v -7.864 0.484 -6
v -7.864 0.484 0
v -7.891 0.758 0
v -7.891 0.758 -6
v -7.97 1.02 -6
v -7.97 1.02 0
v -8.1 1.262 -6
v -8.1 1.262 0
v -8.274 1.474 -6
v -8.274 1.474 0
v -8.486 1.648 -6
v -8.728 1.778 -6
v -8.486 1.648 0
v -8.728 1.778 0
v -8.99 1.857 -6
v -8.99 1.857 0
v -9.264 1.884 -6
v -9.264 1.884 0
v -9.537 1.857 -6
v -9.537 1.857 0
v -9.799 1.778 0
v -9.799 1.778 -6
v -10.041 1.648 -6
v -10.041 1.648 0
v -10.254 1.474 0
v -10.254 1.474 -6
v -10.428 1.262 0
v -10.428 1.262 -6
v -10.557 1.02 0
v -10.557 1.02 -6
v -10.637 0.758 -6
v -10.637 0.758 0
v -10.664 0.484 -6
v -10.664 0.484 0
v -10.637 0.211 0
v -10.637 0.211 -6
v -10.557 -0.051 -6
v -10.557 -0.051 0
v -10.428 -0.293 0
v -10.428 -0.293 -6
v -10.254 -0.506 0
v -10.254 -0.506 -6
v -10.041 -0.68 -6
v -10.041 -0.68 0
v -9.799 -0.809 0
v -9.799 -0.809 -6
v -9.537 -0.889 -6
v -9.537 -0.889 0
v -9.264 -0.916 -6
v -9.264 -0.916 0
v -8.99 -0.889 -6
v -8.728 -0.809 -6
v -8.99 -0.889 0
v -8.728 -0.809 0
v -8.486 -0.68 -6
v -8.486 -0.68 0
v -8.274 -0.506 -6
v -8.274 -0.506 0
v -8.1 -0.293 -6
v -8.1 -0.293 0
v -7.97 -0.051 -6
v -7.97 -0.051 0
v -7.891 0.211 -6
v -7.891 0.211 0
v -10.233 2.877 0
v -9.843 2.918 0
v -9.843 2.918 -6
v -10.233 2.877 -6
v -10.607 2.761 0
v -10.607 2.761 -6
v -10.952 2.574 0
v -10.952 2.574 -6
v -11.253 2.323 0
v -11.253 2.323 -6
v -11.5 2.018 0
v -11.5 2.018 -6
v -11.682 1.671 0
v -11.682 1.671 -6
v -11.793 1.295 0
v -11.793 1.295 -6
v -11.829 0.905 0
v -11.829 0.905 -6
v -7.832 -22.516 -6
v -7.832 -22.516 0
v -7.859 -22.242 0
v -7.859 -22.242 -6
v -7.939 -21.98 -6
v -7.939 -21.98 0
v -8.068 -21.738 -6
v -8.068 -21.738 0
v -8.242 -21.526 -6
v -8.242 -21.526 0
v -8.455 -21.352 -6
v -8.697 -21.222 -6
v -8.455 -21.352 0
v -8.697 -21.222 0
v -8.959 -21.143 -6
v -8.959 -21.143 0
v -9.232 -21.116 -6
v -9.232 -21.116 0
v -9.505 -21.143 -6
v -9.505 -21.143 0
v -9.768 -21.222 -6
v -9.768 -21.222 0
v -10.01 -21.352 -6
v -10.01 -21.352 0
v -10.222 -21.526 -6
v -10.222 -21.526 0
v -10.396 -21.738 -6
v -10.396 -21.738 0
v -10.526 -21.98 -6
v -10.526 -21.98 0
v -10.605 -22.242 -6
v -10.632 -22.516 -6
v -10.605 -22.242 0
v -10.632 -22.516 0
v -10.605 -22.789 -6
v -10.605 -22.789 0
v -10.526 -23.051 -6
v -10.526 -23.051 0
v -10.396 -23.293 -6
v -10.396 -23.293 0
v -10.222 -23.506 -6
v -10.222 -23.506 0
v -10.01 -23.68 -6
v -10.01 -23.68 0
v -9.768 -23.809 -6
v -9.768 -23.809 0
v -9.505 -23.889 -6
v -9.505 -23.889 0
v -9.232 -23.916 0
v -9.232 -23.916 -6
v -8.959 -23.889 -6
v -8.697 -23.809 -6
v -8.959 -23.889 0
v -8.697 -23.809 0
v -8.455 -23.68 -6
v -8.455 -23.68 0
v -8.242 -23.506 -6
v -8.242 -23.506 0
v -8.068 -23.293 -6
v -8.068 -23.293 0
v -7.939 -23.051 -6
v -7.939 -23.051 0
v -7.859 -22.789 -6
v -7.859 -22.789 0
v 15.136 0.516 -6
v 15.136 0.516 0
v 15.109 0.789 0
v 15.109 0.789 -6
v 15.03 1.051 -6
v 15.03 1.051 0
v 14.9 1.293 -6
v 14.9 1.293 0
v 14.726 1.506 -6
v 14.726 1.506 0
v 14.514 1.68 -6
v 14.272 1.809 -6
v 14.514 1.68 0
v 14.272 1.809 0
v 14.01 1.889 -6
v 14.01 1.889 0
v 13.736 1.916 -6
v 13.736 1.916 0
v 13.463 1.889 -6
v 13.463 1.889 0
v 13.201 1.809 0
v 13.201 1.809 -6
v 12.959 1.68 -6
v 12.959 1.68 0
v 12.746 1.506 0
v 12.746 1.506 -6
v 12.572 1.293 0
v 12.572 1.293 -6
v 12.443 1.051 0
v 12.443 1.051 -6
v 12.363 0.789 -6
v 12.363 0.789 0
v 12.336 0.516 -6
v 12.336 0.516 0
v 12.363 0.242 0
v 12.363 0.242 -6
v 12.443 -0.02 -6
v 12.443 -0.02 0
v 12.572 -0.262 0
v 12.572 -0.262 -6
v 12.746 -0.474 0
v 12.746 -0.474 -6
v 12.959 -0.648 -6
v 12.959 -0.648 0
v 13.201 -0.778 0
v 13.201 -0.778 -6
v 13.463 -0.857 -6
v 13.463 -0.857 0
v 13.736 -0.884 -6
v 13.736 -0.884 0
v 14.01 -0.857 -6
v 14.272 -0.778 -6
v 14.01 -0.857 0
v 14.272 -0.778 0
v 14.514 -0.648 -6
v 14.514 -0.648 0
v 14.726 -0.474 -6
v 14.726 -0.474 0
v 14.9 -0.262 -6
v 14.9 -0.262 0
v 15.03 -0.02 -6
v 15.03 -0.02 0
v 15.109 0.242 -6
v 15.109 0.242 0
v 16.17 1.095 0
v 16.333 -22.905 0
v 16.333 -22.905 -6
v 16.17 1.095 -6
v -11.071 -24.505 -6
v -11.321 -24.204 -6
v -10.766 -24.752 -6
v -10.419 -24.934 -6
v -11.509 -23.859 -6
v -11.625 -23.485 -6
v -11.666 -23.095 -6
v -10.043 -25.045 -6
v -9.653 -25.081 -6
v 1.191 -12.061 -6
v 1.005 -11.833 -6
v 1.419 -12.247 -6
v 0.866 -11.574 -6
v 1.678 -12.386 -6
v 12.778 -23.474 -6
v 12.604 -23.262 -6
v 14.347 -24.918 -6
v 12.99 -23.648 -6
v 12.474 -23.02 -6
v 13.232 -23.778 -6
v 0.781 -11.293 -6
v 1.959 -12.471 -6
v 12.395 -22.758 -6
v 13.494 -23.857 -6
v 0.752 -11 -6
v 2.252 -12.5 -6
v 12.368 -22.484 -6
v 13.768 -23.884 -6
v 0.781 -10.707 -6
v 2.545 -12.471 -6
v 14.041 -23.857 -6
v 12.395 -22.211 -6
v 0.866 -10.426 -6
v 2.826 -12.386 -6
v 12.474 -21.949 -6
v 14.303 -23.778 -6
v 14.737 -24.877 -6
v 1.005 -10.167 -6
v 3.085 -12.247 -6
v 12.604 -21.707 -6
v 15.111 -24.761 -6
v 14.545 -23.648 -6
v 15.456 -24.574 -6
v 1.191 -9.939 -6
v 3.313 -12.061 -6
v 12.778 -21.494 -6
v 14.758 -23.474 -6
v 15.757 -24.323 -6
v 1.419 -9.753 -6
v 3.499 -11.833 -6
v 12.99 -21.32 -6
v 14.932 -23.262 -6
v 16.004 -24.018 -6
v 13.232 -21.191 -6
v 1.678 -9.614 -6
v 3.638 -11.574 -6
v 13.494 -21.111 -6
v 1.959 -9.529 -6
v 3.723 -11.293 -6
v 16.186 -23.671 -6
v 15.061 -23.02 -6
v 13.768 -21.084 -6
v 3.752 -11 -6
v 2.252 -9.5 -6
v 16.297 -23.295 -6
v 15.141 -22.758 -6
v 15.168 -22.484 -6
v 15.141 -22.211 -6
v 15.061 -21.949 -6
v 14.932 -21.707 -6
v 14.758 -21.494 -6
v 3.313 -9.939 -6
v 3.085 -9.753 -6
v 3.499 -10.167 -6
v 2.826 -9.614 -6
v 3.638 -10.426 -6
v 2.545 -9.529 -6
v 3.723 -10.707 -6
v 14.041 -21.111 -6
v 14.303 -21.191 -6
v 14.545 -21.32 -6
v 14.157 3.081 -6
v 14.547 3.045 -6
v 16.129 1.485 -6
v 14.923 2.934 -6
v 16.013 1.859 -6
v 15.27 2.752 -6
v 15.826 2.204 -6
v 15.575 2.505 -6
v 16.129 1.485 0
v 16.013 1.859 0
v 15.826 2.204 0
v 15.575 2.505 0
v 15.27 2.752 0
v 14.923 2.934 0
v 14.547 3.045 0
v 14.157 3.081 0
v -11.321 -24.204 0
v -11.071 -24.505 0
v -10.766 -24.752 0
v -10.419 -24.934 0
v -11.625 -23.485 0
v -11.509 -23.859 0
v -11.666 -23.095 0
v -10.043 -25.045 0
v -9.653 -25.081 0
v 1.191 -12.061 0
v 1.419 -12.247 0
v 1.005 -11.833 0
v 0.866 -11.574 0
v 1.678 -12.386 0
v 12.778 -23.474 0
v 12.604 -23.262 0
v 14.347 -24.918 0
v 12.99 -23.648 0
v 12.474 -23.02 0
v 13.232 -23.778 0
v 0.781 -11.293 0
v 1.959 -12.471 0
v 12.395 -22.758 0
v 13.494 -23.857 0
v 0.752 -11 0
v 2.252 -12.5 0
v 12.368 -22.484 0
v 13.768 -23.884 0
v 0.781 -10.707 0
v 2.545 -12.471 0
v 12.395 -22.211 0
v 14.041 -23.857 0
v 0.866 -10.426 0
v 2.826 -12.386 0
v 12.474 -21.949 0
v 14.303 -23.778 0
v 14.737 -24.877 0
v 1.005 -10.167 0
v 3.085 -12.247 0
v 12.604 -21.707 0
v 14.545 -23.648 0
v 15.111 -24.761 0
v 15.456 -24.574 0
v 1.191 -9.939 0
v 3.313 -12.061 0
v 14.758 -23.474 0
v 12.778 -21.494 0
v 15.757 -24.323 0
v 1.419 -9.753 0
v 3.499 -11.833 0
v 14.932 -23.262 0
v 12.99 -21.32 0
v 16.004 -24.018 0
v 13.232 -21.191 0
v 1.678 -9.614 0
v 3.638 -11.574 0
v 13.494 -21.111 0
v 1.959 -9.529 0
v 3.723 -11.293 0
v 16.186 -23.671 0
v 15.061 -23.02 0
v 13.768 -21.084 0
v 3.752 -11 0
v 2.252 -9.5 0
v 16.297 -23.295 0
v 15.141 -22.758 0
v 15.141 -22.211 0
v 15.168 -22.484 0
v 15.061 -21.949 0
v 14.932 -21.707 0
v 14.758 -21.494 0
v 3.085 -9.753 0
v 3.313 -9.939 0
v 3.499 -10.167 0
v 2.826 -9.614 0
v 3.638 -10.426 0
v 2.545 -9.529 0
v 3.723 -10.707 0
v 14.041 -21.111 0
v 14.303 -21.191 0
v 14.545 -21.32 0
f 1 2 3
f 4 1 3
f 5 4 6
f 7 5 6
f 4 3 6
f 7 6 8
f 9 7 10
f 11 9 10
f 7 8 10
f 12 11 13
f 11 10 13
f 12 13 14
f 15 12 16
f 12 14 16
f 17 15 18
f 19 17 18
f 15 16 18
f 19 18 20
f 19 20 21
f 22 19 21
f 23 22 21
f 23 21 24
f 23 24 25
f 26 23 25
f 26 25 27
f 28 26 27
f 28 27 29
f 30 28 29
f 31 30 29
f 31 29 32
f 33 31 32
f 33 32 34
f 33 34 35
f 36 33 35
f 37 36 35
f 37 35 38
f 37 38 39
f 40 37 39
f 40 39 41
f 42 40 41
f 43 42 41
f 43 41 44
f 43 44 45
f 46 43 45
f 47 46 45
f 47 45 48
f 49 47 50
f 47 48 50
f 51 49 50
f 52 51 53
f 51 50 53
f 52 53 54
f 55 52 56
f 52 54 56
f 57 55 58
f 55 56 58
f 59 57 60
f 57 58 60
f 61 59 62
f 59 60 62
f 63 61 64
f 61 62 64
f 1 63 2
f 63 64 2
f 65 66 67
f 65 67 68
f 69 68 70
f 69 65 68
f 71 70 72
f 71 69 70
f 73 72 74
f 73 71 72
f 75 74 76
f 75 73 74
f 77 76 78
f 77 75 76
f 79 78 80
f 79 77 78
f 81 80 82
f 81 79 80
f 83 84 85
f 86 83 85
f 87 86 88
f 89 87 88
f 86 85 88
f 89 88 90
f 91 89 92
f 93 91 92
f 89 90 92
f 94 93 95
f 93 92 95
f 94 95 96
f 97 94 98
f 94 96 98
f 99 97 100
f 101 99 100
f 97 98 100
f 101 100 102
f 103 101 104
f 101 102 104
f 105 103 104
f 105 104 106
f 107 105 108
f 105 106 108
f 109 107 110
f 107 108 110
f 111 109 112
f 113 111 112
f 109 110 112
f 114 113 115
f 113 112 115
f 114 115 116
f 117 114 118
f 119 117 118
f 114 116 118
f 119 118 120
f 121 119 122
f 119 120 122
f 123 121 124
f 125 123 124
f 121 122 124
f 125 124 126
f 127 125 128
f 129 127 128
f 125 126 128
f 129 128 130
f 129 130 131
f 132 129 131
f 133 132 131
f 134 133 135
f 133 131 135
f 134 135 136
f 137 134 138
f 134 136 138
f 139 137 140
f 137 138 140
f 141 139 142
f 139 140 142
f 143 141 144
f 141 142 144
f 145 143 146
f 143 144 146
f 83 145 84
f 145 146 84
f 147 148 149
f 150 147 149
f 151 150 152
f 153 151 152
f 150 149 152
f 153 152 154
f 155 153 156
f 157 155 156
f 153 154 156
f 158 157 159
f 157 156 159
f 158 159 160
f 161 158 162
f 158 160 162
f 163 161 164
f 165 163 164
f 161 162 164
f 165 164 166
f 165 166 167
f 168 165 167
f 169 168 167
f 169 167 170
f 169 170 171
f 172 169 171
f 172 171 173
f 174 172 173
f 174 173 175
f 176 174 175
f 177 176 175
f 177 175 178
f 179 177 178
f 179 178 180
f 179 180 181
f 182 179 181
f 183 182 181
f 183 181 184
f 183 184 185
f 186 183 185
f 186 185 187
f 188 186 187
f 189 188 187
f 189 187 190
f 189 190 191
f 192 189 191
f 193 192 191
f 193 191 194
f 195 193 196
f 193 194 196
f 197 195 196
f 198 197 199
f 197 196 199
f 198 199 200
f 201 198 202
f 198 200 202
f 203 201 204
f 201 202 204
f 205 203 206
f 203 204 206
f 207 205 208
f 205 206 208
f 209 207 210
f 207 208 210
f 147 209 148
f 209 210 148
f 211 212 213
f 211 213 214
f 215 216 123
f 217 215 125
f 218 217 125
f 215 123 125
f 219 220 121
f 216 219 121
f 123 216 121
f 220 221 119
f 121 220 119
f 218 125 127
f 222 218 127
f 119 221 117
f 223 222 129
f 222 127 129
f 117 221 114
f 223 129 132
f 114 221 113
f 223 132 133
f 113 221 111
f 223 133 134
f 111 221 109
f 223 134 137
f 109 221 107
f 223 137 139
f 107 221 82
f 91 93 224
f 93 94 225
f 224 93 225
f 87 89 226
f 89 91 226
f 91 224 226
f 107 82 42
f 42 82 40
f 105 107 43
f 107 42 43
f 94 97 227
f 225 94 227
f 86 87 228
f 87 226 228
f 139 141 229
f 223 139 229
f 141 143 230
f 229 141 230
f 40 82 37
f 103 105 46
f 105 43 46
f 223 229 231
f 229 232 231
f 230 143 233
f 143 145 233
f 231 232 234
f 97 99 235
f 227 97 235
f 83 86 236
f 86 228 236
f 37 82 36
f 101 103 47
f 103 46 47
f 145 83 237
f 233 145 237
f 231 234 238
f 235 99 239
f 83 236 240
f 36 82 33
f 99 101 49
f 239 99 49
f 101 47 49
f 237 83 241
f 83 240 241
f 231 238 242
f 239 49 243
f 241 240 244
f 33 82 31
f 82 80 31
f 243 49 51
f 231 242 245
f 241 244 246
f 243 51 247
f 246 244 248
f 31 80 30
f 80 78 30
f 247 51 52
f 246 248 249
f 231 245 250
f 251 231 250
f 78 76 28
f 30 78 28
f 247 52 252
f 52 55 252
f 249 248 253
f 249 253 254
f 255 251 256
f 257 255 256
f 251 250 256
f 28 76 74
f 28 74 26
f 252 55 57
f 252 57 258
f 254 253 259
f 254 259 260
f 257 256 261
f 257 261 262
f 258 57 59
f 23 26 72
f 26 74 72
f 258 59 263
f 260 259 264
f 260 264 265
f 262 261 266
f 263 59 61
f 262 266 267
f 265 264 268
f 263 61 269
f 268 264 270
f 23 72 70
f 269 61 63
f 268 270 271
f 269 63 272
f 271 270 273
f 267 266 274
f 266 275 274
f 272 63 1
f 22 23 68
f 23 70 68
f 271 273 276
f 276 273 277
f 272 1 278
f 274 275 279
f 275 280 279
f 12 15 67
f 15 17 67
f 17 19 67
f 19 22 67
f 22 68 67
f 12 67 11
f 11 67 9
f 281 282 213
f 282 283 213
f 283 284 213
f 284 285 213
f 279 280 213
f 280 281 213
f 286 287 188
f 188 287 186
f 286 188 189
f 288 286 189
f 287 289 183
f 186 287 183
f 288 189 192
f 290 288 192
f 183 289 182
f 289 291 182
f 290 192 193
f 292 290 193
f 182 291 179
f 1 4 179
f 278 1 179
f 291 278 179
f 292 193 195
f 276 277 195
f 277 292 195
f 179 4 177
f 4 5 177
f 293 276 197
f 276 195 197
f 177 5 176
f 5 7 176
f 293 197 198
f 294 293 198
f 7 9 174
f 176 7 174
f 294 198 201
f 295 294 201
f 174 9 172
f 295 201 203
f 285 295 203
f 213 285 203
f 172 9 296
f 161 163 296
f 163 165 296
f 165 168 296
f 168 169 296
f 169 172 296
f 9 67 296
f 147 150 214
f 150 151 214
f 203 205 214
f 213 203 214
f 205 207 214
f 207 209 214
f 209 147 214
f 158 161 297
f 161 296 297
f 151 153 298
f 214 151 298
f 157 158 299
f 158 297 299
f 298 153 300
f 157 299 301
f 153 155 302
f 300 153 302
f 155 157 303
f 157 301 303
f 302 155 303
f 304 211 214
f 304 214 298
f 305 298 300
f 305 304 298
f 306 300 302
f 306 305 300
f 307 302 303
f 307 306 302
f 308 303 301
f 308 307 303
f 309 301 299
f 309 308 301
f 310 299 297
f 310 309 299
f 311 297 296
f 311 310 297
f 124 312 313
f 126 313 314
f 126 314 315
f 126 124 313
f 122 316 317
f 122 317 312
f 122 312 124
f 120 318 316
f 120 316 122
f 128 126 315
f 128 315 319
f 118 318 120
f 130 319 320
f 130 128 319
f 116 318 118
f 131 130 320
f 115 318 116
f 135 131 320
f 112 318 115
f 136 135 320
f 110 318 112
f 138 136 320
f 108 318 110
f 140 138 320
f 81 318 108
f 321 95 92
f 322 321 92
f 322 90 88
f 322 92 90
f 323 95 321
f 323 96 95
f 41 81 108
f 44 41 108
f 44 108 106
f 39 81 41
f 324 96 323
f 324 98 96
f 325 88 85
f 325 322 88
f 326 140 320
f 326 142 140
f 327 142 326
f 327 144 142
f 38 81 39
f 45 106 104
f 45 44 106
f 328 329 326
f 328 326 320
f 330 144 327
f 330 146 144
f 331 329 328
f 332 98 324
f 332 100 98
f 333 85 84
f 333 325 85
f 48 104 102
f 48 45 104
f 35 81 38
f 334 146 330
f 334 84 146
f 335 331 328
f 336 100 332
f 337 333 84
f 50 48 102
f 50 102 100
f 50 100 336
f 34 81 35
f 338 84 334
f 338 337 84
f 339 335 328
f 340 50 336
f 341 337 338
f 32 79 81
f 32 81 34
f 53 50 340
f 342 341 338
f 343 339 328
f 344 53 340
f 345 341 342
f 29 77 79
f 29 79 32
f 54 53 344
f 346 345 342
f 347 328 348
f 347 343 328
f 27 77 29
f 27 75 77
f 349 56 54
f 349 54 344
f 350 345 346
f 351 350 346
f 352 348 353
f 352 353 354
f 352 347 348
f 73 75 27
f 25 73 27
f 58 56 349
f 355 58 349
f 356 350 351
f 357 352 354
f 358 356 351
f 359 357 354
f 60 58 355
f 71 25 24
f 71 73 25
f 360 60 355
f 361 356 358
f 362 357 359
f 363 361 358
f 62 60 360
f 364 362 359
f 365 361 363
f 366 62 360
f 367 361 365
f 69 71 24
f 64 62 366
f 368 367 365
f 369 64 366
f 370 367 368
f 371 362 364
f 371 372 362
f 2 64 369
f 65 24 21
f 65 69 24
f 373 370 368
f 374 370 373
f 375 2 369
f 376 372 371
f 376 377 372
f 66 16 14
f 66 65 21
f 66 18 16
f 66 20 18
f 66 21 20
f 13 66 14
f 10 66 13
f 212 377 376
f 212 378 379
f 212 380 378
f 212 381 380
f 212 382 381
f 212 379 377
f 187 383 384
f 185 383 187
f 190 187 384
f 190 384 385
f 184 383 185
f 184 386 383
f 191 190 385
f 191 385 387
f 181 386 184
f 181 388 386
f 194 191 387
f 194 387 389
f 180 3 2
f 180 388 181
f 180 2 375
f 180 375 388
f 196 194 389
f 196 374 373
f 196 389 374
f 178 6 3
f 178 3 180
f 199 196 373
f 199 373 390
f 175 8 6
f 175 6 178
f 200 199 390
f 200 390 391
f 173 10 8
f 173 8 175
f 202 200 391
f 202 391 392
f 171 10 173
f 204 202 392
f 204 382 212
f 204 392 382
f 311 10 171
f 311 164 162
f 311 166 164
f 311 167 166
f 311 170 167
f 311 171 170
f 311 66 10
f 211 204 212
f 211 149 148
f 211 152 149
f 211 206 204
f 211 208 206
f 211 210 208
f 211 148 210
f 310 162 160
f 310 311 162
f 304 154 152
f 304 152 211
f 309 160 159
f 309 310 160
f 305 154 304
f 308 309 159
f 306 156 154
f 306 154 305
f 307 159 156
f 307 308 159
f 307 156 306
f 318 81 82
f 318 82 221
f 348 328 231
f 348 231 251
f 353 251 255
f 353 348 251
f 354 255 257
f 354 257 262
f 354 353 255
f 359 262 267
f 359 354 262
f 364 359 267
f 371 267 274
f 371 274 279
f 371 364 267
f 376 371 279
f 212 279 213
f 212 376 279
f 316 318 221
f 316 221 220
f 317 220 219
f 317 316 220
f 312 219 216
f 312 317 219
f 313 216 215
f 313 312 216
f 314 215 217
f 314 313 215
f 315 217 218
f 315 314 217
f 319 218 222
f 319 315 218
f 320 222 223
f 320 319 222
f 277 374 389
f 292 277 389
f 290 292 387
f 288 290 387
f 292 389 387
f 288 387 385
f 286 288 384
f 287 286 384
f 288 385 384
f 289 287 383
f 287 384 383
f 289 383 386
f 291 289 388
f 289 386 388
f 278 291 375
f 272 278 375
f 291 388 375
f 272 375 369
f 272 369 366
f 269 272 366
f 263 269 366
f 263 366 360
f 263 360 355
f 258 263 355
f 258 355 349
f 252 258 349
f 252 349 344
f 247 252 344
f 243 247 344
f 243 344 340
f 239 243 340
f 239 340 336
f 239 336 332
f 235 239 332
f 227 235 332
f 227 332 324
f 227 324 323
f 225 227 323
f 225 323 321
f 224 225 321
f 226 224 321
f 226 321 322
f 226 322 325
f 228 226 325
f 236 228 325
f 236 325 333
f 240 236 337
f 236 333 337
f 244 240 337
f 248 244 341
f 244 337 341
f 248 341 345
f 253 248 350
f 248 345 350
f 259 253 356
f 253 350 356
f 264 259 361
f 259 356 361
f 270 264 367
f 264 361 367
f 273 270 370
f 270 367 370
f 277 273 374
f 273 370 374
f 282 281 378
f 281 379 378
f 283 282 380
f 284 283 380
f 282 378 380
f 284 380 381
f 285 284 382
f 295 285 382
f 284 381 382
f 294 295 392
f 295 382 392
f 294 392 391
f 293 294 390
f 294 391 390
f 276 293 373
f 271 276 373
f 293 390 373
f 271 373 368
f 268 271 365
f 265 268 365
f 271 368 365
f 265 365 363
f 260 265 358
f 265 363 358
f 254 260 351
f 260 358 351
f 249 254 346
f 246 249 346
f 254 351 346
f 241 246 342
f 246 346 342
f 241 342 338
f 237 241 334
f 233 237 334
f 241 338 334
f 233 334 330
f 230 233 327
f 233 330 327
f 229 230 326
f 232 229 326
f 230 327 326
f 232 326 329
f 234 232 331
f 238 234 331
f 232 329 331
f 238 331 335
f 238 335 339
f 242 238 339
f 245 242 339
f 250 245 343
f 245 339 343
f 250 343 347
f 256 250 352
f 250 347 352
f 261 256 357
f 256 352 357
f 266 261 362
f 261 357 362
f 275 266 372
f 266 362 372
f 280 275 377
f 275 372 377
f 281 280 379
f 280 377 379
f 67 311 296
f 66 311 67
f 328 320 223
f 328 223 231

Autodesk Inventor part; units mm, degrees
ref_plane "YZ Plane" through (0, 0, 0) normal (1, 0, 0) x (0, 1, 0)
ref_plane "XZ Plane" through (0, 0, 0) normal (0, 1, 0) x (-1, 0, 0)
ref_plane "XY Plane" through (0, 0, 0) normal (0, 0, 1) x (1, 0, 0)
ref_plane "Arbeitsebene1" through (0, 0, 0) normal (0, 0, 1) x (1, 0, 0)
sketch "Skizze1" plane through (0, 0, 0) normal (0, 0, 1) x (1, 0, 0)
  line L0 (11.7109, -4.9124) -> (9.211, -4.9293) projected
  line L1 (9.211, -4.9293) -> (9.1974, -2.9294) projected
  line L2 (9.1974, -2.9294) -> (-3.8023, -3.0177) projected
  line L3 (-3.8023, -3.0177) -> (-3.8306, 1.1495) projected
  line L4 (-3.8306, 1.1495) -> (-6.8306, 1.1291) projected
  line L5 (-6.8306, 1.1291) -> (-6.6653, -23.2049) projected
  line L6 (-6.6653, -23.2049) -> (-3.6653, -23.1845) projected
  line L7 (-3.6653, -23.1845) -> (-3.6937, -19.0173) projected
  line L8 (-3.6937, -19.0173) -> (9.306, -18.929) projected
  line L9 (9.306, -18.929) -> (9.2925, -16.9291) projected
  line L10 (9.2925, -16.9291) -> (11.7924, -16.9121) projected
  line L11 (11.7924, -16.9121) -> (11.7109, -4.9124) projected
  circle A0 centre (13.7364, 0.5156) radius 1.025 projected
  circle A1 centre (13.7676, -22.4844) radius 1.025 projected
  circle A2 centre (-9.2323, -22.5156) radius 1.025 projected
  circle A3 centre (-9.2636, 0.4844) radius 1.025 projected
  line L12 (-11.8291, 0.9046) -> (-11.6661, -23.0948) projected
  arc A4 (-9.8428, 2.9182) -> (-11.8291, 0.9046) centre (-9.8292, 0.9182) ccw projected
  line L13 (14.1567, 3.0812) -> (-9.8428, 2.9182) projected
  arc A5 (16.1702, 1.0948) -> (14.1567, 3.0812) centre (14.1703, 1.0812) ccw projected
  line L14 (16.3332, -22.9046) -> (16.1702, 1.0948) projected
  arc A6 (14.3468, -24.9182) -> (16.3332, -22.9046) centre (14.3333, -22.9182) ccw projected
  line L15 (-9.6526, -25.0812) -> (14.3468, -24.9182) projected
  arc A7 (-11.6661, -23.0948) -> (-9.6526, -25.0812) centre (-9.6662, -23.0812) ccw projected
  circle A8 centre (2.252, -11) radius 7.5 projected
  circle A9 centre (2.252, -11) radius 1.5
  circle A10 centre (-9.2323, -22.5156) radius 1.4
  circle A11 centre (13.7676, -22.4844) radius 1.4
  circle A12 centre (-9.2636, 0.4844) radius 1.4
  circle A13 centre (13.7364, 0.5156) radius 1.4
  point P0 (0, 0)
  dimension "d0" = 3
  dimension "d1" = 2.8
  dimension "d2" = 2.8
  dimension "d3" = 2.8
  dimension "d4" = 2.8
extrude "Extrusion1" add sketch "Skizze1" against normal blind 6 contours L11 L10 L9 L8 L7 L6 L5 L4 L3 L2 L1 L0 | A4 L13 A5 L14 A6 L15 A7 L12 | A8
properties part number "00_Micro_Stepper_15mm_Gearbox_counterbearing"
